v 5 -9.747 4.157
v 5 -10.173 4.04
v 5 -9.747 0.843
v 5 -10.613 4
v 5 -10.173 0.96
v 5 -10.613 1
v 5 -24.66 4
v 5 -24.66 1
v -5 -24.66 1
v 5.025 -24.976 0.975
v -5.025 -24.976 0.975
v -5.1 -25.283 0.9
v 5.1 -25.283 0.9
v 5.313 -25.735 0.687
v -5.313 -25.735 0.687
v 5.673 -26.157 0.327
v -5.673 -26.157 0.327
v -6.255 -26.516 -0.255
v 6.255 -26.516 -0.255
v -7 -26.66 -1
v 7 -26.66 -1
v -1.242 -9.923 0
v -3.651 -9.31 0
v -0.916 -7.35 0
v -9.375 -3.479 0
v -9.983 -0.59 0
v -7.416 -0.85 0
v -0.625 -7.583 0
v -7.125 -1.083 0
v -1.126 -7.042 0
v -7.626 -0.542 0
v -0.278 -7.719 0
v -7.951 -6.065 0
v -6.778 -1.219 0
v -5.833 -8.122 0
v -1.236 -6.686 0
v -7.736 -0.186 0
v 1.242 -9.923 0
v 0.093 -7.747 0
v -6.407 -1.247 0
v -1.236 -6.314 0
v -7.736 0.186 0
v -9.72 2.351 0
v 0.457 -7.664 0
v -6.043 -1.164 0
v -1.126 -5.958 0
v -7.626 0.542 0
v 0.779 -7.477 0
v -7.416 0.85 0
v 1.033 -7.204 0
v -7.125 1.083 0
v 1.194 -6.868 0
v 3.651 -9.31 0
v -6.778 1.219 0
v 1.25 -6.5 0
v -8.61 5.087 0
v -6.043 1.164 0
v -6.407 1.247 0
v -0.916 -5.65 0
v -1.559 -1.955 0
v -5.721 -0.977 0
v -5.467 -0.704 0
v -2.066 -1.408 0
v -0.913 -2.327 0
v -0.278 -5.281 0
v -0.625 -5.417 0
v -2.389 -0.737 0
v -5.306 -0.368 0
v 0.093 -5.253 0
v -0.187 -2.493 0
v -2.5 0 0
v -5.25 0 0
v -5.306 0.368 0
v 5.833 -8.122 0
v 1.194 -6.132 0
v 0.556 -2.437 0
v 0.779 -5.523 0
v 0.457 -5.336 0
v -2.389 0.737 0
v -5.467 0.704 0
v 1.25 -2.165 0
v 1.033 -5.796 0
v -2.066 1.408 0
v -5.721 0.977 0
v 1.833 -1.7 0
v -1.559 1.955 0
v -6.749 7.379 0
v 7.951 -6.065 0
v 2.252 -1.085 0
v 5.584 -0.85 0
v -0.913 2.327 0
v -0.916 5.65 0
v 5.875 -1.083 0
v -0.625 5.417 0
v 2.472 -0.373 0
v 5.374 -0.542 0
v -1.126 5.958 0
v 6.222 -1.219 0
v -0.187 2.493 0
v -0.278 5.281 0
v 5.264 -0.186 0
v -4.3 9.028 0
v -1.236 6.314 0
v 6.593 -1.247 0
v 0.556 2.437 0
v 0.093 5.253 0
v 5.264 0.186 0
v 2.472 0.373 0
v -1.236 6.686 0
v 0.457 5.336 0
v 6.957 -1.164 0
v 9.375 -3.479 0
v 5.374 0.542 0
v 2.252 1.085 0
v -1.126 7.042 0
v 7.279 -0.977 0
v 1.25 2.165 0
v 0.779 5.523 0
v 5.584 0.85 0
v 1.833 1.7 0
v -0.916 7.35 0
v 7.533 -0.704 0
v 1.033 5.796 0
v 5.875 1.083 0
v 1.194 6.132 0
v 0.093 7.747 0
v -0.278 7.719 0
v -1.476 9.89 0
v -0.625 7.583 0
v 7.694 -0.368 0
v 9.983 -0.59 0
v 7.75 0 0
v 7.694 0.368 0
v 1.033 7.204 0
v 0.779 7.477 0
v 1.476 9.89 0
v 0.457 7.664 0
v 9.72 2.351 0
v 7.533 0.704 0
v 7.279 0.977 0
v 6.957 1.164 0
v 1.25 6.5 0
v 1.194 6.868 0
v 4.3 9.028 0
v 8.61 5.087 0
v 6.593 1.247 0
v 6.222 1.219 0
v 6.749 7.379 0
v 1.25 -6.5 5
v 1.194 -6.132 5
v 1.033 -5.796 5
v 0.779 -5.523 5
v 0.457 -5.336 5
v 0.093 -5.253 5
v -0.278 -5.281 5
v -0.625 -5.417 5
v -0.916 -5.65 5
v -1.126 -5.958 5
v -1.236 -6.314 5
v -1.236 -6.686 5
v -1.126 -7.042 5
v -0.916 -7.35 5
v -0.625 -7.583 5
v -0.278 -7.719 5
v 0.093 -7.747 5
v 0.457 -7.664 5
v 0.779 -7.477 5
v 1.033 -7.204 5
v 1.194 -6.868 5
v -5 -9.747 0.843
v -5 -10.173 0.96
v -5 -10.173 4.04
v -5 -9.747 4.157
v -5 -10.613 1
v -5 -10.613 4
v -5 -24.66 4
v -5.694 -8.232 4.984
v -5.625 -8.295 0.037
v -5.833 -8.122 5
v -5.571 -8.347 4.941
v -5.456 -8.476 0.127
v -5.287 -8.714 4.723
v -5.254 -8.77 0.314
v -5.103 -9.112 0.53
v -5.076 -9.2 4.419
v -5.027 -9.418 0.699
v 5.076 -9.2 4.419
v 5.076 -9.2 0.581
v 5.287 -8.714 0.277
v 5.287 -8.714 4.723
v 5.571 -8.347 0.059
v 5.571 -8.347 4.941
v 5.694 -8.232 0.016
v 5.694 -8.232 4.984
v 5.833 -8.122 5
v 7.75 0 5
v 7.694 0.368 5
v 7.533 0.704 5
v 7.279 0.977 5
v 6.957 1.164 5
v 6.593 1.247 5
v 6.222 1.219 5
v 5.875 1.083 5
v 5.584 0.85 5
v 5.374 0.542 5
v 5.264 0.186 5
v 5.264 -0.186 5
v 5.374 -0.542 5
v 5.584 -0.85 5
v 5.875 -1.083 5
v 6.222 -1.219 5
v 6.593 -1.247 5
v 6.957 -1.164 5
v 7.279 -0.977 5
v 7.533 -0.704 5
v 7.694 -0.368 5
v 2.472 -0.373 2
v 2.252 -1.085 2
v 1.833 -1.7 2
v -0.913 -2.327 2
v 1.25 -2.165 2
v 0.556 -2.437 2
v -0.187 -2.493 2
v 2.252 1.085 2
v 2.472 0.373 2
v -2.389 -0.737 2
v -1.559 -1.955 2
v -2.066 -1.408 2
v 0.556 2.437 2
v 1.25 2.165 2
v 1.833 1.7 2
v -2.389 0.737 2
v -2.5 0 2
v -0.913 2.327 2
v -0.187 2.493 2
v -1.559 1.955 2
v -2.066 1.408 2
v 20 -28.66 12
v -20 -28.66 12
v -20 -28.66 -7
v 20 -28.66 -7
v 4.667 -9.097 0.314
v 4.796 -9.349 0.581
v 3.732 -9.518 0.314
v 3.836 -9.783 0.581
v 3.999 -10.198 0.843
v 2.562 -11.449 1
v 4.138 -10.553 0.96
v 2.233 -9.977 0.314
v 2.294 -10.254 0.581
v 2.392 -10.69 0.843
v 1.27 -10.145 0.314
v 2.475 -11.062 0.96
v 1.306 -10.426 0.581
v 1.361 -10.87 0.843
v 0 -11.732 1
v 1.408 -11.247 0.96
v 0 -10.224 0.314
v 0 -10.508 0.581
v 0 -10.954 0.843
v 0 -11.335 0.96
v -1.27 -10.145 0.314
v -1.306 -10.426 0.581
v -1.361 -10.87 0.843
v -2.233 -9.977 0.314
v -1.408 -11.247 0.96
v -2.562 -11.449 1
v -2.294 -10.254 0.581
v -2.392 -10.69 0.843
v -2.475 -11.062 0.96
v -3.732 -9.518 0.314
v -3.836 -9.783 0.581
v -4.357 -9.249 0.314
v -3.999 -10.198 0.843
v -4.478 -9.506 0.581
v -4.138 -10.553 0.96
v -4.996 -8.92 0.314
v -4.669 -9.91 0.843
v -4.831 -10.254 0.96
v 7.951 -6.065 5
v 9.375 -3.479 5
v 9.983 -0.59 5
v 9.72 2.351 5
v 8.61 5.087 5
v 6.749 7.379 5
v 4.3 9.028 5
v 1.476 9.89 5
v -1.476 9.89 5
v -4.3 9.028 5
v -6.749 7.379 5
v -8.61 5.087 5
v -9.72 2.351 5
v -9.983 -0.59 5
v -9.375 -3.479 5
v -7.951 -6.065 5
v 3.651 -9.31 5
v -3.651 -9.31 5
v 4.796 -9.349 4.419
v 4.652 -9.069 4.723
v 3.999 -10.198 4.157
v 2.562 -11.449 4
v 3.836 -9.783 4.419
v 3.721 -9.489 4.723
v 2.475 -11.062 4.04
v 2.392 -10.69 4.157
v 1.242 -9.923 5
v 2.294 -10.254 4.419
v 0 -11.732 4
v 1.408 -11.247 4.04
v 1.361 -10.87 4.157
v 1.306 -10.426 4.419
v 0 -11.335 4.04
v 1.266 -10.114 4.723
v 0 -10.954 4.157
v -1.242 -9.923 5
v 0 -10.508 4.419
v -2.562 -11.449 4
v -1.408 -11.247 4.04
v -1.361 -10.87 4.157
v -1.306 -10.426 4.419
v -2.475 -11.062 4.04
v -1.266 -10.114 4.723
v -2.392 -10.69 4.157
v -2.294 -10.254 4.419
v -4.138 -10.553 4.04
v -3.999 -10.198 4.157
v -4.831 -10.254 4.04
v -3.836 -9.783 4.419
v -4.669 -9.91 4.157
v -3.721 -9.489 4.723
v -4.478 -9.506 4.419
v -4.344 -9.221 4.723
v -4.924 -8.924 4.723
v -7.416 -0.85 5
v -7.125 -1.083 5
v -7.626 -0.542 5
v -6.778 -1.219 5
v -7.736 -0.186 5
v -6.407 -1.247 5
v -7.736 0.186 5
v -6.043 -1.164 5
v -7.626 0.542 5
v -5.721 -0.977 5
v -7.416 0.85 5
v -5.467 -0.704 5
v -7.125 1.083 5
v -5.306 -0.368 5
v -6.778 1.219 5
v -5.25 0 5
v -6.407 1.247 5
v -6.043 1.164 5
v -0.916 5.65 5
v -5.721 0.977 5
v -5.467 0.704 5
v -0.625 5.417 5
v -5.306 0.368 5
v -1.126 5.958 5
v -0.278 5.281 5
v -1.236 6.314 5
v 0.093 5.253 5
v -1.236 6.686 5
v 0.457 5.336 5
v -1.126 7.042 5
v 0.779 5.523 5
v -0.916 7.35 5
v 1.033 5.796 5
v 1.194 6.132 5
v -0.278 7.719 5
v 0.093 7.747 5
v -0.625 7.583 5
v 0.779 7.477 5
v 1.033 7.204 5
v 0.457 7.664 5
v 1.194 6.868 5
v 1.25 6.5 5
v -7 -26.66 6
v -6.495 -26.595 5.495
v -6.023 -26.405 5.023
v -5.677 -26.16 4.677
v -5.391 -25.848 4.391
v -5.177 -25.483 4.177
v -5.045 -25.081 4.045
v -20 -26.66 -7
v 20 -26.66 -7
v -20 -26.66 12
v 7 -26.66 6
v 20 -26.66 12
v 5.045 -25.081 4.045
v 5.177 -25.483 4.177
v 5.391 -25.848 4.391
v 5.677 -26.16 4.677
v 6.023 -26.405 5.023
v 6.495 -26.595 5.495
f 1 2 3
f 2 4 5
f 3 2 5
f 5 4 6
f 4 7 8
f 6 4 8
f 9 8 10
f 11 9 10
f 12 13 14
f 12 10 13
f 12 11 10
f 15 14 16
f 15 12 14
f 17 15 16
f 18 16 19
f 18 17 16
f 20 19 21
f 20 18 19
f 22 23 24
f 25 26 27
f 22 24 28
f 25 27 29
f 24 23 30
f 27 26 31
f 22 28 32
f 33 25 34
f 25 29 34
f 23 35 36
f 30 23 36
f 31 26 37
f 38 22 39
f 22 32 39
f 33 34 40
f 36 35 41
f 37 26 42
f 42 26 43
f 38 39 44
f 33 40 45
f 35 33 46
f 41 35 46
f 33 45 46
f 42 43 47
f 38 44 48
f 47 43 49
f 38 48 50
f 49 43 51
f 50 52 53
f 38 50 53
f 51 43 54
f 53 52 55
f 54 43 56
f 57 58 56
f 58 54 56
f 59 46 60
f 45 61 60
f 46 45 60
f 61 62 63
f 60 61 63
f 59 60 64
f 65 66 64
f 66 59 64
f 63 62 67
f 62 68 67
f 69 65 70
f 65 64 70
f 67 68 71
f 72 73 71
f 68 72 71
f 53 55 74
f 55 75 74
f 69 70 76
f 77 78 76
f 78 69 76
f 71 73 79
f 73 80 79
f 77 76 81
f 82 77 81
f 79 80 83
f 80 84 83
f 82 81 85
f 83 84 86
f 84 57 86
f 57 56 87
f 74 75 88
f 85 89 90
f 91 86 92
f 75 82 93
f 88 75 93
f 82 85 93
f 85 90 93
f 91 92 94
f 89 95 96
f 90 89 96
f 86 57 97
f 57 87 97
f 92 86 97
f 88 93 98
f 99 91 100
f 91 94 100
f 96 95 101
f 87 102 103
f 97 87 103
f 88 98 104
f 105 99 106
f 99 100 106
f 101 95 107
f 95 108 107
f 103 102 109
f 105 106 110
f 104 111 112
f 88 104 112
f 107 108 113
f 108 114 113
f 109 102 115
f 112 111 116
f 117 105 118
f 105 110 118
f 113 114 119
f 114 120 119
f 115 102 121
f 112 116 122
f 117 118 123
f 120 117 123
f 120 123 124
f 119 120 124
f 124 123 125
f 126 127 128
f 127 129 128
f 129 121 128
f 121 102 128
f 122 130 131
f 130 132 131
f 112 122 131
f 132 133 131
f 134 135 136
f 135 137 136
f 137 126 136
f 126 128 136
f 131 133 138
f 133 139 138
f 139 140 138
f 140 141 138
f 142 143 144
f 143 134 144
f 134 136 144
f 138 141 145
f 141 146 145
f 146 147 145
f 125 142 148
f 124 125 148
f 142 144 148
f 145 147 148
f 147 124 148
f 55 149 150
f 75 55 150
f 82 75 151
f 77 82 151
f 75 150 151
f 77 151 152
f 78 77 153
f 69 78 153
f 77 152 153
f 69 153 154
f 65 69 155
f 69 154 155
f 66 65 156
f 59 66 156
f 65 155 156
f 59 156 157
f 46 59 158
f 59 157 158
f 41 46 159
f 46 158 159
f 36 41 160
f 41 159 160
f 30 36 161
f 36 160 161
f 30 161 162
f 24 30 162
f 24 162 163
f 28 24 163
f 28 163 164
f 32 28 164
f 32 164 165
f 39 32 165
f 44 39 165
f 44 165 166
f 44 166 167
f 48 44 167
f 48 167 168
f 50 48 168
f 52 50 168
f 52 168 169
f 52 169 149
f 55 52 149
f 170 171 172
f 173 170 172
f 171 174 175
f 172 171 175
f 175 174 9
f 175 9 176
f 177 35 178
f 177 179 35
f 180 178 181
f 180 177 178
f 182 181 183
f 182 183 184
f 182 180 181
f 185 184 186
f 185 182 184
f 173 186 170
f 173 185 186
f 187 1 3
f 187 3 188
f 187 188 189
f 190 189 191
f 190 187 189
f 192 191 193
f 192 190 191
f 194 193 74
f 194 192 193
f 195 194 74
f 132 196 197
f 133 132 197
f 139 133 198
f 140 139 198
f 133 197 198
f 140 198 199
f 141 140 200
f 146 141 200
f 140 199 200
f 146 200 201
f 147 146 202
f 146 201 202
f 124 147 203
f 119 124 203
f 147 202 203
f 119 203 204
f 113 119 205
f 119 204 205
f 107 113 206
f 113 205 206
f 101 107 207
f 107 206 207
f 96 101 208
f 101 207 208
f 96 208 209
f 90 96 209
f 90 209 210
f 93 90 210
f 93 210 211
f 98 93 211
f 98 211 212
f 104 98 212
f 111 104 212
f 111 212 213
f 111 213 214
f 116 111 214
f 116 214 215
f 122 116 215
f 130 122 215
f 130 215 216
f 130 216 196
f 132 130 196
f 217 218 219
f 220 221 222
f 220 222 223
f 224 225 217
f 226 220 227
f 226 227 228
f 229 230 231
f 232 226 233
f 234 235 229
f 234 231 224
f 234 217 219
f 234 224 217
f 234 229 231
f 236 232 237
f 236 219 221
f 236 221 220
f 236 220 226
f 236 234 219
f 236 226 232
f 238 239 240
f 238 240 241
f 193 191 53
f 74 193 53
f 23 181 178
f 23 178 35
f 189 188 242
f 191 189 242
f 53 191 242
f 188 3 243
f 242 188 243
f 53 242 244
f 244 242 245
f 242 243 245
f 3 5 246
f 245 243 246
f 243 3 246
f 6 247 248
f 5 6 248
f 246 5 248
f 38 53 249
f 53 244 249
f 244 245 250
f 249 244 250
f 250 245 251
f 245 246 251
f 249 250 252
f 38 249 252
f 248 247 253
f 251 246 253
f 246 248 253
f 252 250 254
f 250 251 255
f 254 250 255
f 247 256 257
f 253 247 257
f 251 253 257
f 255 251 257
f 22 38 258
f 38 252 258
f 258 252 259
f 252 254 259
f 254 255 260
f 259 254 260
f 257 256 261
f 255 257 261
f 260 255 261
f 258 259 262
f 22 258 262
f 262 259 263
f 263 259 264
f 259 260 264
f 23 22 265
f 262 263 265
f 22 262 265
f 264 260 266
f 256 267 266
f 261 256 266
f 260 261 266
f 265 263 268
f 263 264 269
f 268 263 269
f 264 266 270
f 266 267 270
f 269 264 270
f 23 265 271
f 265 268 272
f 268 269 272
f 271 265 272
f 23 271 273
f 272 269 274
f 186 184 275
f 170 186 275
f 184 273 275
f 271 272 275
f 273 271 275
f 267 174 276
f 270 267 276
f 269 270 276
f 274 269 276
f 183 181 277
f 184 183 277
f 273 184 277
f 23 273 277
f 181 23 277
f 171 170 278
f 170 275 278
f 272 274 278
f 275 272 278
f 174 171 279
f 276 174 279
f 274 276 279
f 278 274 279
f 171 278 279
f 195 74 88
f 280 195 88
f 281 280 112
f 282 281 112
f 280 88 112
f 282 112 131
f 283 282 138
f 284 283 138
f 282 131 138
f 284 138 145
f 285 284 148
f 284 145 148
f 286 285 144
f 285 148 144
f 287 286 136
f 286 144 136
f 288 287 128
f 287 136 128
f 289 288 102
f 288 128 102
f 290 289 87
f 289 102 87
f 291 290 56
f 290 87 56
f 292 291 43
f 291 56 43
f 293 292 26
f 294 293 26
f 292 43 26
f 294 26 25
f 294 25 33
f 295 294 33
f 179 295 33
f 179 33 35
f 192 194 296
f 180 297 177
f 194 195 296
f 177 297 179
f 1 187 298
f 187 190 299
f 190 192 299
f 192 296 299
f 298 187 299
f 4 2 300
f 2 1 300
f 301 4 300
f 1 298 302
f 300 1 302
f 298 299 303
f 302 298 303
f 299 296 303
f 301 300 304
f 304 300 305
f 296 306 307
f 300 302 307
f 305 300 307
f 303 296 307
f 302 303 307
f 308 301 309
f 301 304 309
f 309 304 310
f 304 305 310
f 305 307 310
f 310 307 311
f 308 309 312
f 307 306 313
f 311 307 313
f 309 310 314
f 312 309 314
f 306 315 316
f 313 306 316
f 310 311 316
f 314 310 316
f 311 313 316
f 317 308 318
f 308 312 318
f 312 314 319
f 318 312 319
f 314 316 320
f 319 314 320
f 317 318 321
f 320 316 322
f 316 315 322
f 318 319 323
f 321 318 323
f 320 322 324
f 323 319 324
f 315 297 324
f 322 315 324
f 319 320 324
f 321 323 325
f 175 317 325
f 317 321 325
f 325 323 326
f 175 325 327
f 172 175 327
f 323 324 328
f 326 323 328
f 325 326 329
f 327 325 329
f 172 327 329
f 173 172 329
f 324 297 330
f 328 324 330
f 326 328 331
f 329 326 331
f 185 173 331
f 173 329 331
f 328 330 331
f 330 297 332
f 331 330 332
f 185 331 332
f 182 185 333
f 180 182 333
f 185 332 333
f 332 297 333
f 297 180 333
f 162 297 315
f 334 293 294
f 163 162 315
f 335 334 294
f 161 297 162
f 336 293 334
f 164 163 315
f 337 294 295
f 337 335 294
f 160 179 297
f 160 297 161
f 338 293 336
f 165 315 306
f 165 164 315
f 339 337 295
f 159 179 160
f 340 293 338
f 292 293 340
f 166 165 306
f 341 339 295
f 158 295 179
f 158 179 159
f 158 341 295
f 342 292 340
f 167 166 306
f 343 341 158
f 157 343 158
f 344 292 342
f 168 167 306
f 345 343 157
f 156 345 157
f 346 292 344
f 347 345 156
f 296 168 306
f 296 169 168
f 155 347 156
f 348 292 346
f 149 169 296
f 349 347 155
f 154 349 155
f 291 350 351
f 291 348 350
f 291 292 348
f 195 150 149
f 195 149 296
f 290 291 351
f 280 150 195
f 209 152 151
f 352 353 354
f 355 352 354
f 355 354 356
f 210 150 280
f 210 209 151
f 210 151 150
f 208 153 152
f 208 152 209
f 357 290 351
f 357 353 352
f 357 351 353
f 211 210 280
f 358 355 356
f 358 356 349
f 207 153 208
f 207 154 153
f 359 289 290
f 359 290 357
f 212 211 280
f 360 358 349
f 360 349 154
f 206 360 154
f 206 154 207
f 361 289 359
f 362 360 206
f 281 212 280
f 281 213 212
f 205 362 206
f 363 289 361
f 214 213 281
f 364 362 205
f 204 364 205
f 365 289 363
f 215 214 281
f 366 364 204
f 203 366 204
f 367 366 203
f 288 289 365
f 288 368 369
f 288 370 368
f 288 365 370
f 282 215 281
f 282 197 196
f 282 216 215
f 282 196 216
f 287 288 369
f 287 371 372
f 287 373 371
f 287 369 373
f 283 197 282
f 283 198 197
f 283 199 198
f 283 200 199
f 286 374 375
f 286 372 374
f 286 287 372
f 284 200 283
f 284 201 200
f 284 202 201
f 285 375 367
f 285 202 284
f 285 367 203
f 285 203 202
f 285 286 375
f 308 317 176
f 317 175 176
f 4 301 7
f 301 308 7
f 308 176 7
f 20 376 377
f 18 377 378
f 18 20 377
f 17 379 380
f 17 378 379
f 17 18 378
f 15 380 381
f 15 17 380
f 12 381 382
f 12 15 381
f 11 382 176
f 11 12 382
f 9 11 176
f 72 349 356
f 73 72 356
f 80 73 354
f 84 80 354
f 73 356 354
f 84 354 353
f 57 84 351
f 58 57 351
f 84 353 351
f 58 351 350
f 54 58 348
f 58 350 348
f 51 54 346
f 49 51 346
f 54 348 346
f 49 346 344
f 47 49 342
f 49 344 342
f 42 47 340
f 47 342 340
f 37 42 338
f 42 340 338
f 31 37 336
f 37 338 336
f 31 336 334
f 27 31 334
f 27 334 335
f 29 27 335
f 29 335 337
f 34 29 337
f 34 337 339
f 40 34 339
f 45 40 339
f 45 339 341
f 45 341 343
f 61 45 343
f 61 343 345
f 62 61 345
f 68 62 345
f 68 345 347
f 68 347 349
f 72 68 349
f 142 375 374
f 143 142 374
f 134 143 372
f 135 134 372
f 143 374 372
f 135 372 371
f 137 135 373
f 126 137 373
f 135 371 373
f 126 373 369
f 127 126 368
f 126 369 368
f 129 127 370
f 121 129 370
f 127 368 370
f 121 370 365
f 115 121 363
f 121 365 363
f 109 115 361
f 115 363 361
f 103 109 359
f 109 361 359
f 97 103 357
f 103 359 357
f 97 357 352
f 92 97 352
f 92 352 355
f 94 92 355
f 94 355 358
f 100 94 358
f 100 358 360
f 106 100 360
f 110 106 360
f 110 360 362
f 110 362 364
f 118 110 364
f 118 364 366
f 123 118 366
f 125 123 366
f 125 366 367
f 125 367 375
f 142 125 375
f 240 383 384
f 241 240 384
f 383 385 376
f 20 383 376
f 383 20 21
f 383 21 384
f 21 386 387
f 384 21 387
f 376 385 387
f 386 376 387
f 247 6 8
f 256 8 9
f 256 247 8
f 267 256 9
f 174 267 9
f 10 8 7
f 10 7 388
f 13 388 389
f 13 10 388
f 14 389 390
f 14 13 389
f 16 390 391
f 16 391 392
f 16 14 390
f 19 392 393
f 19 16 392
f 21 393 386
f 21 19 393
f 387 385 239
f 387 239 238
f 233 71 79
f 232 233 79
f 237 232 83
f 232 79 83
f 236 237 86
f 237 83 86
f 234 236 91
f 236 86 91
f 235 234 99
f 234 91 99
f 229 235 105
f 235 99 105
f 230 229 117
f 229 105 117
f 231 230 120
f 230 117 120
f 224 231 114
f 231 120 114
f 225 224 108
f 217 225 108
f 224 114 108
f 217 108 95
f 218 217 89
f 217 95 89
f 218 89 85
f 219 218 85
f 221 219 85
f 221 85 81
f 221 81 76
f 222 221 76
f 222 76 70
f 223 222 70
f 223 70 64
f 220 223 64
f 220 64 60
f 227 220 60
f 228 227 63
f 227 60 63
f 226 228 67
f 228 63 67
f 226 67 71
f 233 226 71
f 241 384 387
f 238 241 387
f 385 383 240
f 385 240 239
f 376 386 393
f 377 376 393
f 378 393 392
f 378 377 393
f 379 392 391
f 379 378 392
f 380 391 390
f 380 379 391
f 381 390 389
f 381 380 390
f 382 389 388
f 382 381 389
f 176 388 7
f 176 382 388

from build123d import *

# Parameters (mm, degrees)
SKETCH1_R            = 10
BOSS_EXTRUDE1_DEPTH  = 5
SKETCH2_R            = 1.25
CUT_EXTRUDE1_DEPTH   = 16
SKETCH3_R            = 2.5
CUT_EXTRUDE2_DEPTH   = 2
EXTRUDE_1_DEPTH      = 1.5
EXTRUDE_1_DEPTH_BACK = 1.5
SKETCH_3_W           = 40
SKETCH_3_H           = 19
EXTRUDE_2_DEPTH      = 2
FILLET_1_R           = 2


with BuildPart() as part:
    # Sketch1 → Boss-Extrude1 (new body)
    with BuildSketch(Plane.XY):
        Circle(SKETCH1_R)
    extrude(amount=BOSS_EXTRUDE1_DEPTH)

    # Sketch2 → Cut-Extrude1 (cut, through all)
    with BuildSketch(Plane.XY.offset(5)):
        with Locations((0, 6.5)):
            Circle(SKETCH2_R)
        with Locations((6.5, 0)):
            Circle(SKETCH2_R)
        with Locations((0, -6.5)):
            Circle(SKETCH2_R)
        with Locations((-6.5, 0)):
            Circle(SKETCH2_R)
    extrude(amount=-CUT_EXTRUDE1_DEPTH, mode=Mode.SUBTRACT)

    # Sketch3 → Cut-Extrude2 (cut)
    with BuildSketch(Plane(origin=(0, 0, 0), x_dir=(-1, 0, 0), z_dir=(0, 0, -1))):
        Circle(SKETCH3_R)
    extrude(amount=-CUT_EXTRUDE2_DEPTH, mode=Mode.SUBTRACT)

    # 草图2 → 凸台-拉伸1 (add, two sides: drawn at the far end of the back side and taken through both)
    with BuildSketch(Plane.XY.offset(2.5).offset(-EXTRUDE_1_DEPTH_BACK)):
        with BuildLine():
            Line((-5, -8.660254038), (-5, -26.660254038))
            Line((-5, -26.660254038), (5, -26.660254038))
            Line((5, -26.660254038), (5, -8.660254038))
            ThreePointArc((5, -8.660254038), (0, -10), (-5, -8.660254038))
        make_face()
    extrude(amount=EXTRUDE_1_DEPTH + EXTRUDE_1_DEPTH_BACK)

    # 草图3 → 凸台-拉伸2 (add)
    with BuildSketch(Plane.XZ.offset(26.660254038)):
        with Locations((0, 2.5)):
            Rectangle(SKETCH_3_W, SKETCH_3_H)
    extrude(amount=EXTRUDE_2_DEPTH)

    # 圆角1
    # the kernel refuses this fillet: 2 mm, written as the material it adds along each edge
    with BuildSketch(Plane(origin=(-5, -8.660254038, 4), x_dir=(0, -1, 0), z_dir=(0, 0, -1))) as fillet_1_piece_1:
        with BuildLine():
            CenterArc((1.086540307, 2), FILLET_1_R, 215.685334713, 54.314665287)
            Line((-0.537925417, 0.833333333), (-0.570414732, 0.81))
            ThreePointArc((-0.570414732, 0.81), (-0.292230876, 0.40164682), (-0.034641016, -0.02))
            Line((-0.034641016, -0.02), (0, -0.04))
            Line((0, -0.04), (1.086540307, -0.04))
            Line((1.086540307, -0.04), (1.086540307, 0))
        make_face()
    extrude(amount=3)
    with BuildSketch(Plane(origin=(0, 0, 1), x_dir=(0.8172880266959527, -0.5762293652873269, 0), z_dir=(0.5762293652873269, 0.8172880266959527, 0))) as fillet_1_piece_2_section:
        with BuildLine():
            CenterArc((11.732050808, 2), FILLET_1_R, 210, 60)
            Line((10, 1), (9.965358984, 0.98))
            ThreePointArc((9.965358984, 0.98), (9.96, 0.5), (9.96, 0))
            Line((9.96, 0), (10, -0.04))
            Line((10, -0.04), (11.732050808, -0.04))
            Line((11.732050808, -0.04), (11.732050808, 0))
        make_face()
    fillet_1_piece_2 = revolve(axis=Axis((0, 0, 1), (0, 0, -1)), revolution_arc=109.628458137, mode=Mode.PRIVATE)
    fillet_1_piece_2 = split(fillet_1_piece_2, bisect_by=Plane(origin=(5, -10.001483163, 0.740495883), z_dir=(-1, 0, 0)), keep=Keep.TOP, mode=Mode.PRIVATE)
    fillet_1_piece_2 = split(fillet_1_piece_2, bisect_by=Plane(origin=(-5, -10.001483163, 0.740495883), z_dir=(1, 0, 0)), keep=Keep.TOP, mode=Mode.PRIVATE)
    add(fillet_1_piece_2)
    with BuildSketch(Plane(origin=(5, -8.660254038, 4), x_dir=(0, -1, 0), z_dir=(0, 0, -1))) as fillet_1_piece_3:
        with BuildLine():
            CenterArc((1.086540307, -2), FILLET_1_R, 90, 54.314665287)
            Line((-0.537925417, -0.833333333), (-0.570414732, -0.81))
            ThreePointArc((-0.570414732, -0.81), (-0.292230876, -0.40164682), (-0.034641016, 0.02))
            Line((-0.034641016, 0.02), (0, 0.04))
            Line((0, 0.04), (1.086540307, 0.04))
            Line((1.086540307, 0.04), (1.086540307, 0))
        make_face()
    extrude(amount=3)
    with BuildSketch(Plane(origin=(5, -26.660254038, 1), x_dir=(1, 0, 0), z_dir=(0, 0, 1))) as fillet_1_piece_4:
        with BuildLine():
            CenterArc((FILLET_1_R, FILLET_1_R), FILLET_1_R, 180, 90)
            Line((0, FILLET_1_R), (-FILLET_1_R * 0.02, FILLET_1_R))
            Line((-FILLET_1_R * 0.02, FILLET_1_R), (-FILLET_1_R * 0.02, -FILLET_1_R * 0.02))
            Line((-FILLET_1_R * 0.02, -FILLET_1_R * 0.02), (FILLET_1_R, -FILLET_1_R * 0.02))
            Line((FILLET_1_R, -FILLET_1_R * 0.02), (FILLET_1_R, 0))
        make_face()
    extrude(amount=3)
    with BuildSketch(Plane(origin=(-5, -26.660254038, 1), x_dir=(0, 0, -1), z_dir=(1, 0, 0))) as fillet_1_piece_5:
        with BuildLine():
            CenterArc((FILLET_1_R, FILLET_1_R), FILLET_1_R, 180, 90)
            Line((0, FILLET_1_R), (-FILLET_1_R * 0.02, FILLET_1_R))
            Line((-FILLET_1_R * 0.02, FILLET_1_R), (-FILLET_1_R * 0.02, -FILLET_1_R * 0.02))
            Line((-FILLET_1_R * 0.02, -FILLET_1_R * 0.02), (FILLET_1_R, -FILLET_1_R * 0.02))
            Line((FILLET_1_R, -FILLET_1_R * 0.02), (FILLET_1_R, 0))
        make_face()
    extrude(amount=10)
    with BuildSketch(Plane(origin=(-5, -26.660254038, 1), x_dir=(-1, 0, 0), z_dir=(0, 0, 1))) as fillet_1_piece_6:
        with BuildLine():
            CenterArc((FILLET_1_R, -FILLET_1_R), FILLET_1_R, 90, 90)
            Line((0, -FILLET_1_R), (-FILLET_1_R * 0.02, -FILLET_1_R))
            Line((-FILLET_1_R * 0.02, -FILLET_1_R), (-FILLET_1_R * 0.02, FILLET_1_R * 0.02))
            Line((-FILLET_1_R * 0.02, FILLET_1_R * 0.02), (FILLET_1_R, FILLET_1_R * 0.02))
            Line((FILLET_1_R, FILLET_1_R * 0.02), (FILLET_1_R, 0))
        make_face()
    extrude(amount=3)
    with BuildSketch(Plane(origin=(0, 0, 4), x_dir=(0.8172880266959527, -0.5762293652873269, 0), z_dir=(0.5762293652873269, 0.8172880266959527, 0))) as fillet_1_piece_7_section:
        with BuildLine():
            CenterArc((11.732050808, -2), FILLET_1_R, 90, 60)
            Line((10, -1), (9.965358984, -0.98))
            ThreePointArc((9.965358984, -0.98), (9.96, -0.5), (9.96, 0))
            Line((9.96, 0), (10, 0.04))
            Line((10, 0.04), (11.732050808, 0.04))
            Line((11.732050808, 0.04), (11.732050808, 0))
        make_face()
    fillet_1_piece_7 = revolve(axis=Axis((0, 0, 4), (0, 0, -1)), revolution_arc=109.628458137, mode=Mode.PRIVATE)
    fillet_1_piece_7 = split(fillet_1_piece_7, bisect_by=Plane(origin=(-5, -10.001483163, 4.259504117), z_dir=(1, 0, 0)), keep=Keep.TOP, mode=Mode.PRIVATE)
    fillet_1_piece_7 = split(fillet_1_piece_7, bisect_by=Plane(origin=(5, -10.001483163, 4.259504117), z_dir=(-1, 0, 0)), keep=Keep.TOP, mode=Mode.PRIVATE)
    add(fillet_1_piece_7)
    with BuildSketch(Plane(origin=(-5, -26.660254038, 4), x_dir=(0, 0, 1), z_dir=(1, 0, 0))) as fillet_1_piece_8:
        with BuildLine():
            CenterArc((FILLET_1_R, -FILLET_1_R), FILLET_1_R, 90, 90)
            Line((0, -FILLET_1_R), (-FILLET_1_R * 0.02, -FILLET_1_R))
            Line((-FILLET_1_R * 0.02, -FILLET_1_R), (-FILLET_1_R * 0.02, FILLET_1_R * 0.02))
            Line((-FILLET_1_R * 0.02, FILLET_1_R * 0.02), (FILLET_1_R, FILLET_1_R * 0.02))
            Line((FILLET_1_R, FILLET_1_R * 0.02), (FILLET_1_R, 0))
        make_face()
    extrude(amount=10)
    with BuildSketch(Plane(origin=(0, 0, 4), x_dir=(0.8172880266959527, -0.5762293652873269, 0), z_dir=(0.5762293652873269, 0.8172880266959527, 0))) as fillet_1_piece_9a_section:
        with BuildLine():
            CenterArc((11.732050808, -2), FILLET_1_R, 90, 60)
            Line((10, -1), (9.965358984, -0.98))
            ThreePointArc((9.965358984, -0.98), (9.96, -0.5), (9.96, 0))
            Line((9.96, 0), (10, 0.04))
            Line((10, 0.04), (11.732050808, 0.04))
            Line((11.732050808, 0.04), (11.732050808, 0))
        make_face()
    fillet_1_piece_9a = revolve(axis=Axis((0, 0, 4), (0, 0, -1)), revolution_arc=109.628458137, mode=Mode.PRIVATE)
    fillet_1_piece_9a = split(fillet_1_piece_9a, bisect_by=Plane(origin=(-5, -7.746585208, 4.247464025), z_dir=(-1, 0, 0)), keep=Keep.TOP, mode=Mode.PRIVATE)
    with BuildSketch(Plane(origin=(-5, -8.660254038, 6.716350767), x_dir=(0, -1, 0), z_dir=(0, 0, -1))) as fillet_1_piece_9b_section:
        with BuildLine():
            CenterArc((1.086540307, 2), FILLET_1_R, 215.685334713, 54.314665287)
            Line((-0.537925417, 0.833333333), (-0.570414732, 0.81))
            ThreePointArc((-0.570414732, 0.81), (-0.292230876, 0.40164682), (-0.034641016, -0.02))
            Line((-0.034641016, -0.02), (0, -0.04))
            Line((0, -0.04), (1.086540307, -0.04))
            Line((1.086540307, -0.04), (1.086540307, 0))
        make_face()
    fillet_1_piece_9b = extrude(amount=5.716350767, mode=Mode.PRIVATE)
    fillet_1_piece_9b = split(fillet_1_piece_9b, bisect_by=Plane(origin=(-5.179096693, -8.792679458, 4), z_dir=(0, 0, 1)), keep=Keep.TOP, mode=Mode.PRIVATE)
    fillet_1_piece_9b = split(fillet_1_piece_9b, bisect_by=Plane(origin=(-5.179096693, -8.792679458, 5), z_dir=(0, 0, -1)), keep=Keep.TOP, mode=Mode.PRIVATE)
    fillet_1_piece_9 = fillet_1_piece_9a & fillet_1_piece_9b
    add(fillet_1_piece_9)
    with BuildSketch(Plane(origin=(0, 0, 1), x_dir=(0.8172880266959527, -0.5762293652873269, 0), z_dir=(0.5762293652873269, 0.8172880266959527, 0))) as fillet_1_piece_10a_section:
        with BuildLine():
            CenterArc((11.732050808, 2), FILLET_1_R, 210, 60)
            Line((10, 1), (9.965358984, 0.98))
            ThreePointArc((9.965358984, 0.98), (9.96, 0.5), (9.96, 0))
            Line((9.96, 0), (10, -0.04))
            Line((10, -0.04), (11.732050808, -0.04))
            Line((11.732050808, -0.04), (11.732050808, 0))
        make_face()
    fillet_1_piece_10a = revolve(axis=Axis((0, 0, 1), (0, 0, -1)), revolution_arc=109.628458137, mode=Mode.PRIVATE)
    fillet_1_piece_10a = split(fillet_1_piece_10a, bisect_by=Plane(origin=(-5, -7.746585208, 0.752535975), z_dir=(-1, 0, 0)), keep=Keep.TOP, mode=Mode.PRIVATE)
    with BuildSketch(Plane(origin=(-5, -8.660254038, 4), x_dir=(0, -1, 0), z_dir=(0, 0, -1))) as fillet_1_piece_10b_section:
        with BuildLine():
            CenterArc((1.086540307, 2), FILLET_1_R, 215.685334713, 54.314665287)
            Line((-0.537925417, 0.833333333), (-0.570414732, 0.81))
            ThreePointArc((-0.570414732, 0.81), (-0.292230876, 0.40164682), (-0.034641016, -0.02))
            Line((-0.034641016, -0.02), (0, -0.04))
            Line((0, -0.04), (1.086540307, -0.04))
            Line((1.086540307, -0.04), (1.086540307, 0))
        make_face()
    fillet_1_piece_10b = extrude(amount=5.716350767, mode=Mode.PRIVATE)
    fillet_1_piece_10b = split(fillet_1_piece_10b, bisect_by=Plane(origin=(-5.179096693, -8.792679458, 1), z_dir=(0, 0, -1)), keep=Keep.TOP, mode=Mode.PRIVATE)
    fillet_1_piece_10b = split(fillet_1_piece_10b, bisect_by=Plane(origin=(-5.179096693, -8.792679458, 0), z_dir=(0, 0, 1)), keep=Keep.TOP, mode=Mode.PRIVATE)
    fillet_1_piece_10 = fillet_1_piece_10a & fillet_1_piece_10b
    add(fillet_1_piece_10)
    with BuildSketch(Plane(origin=(5, -8.660254038, 4), x_dir=(0, -1, 0), z_dir=(0, 0, -1))) as fillet_1_piece_11a_section:
        with BuildLine():
            CenterArc((1.086540307, -2), FILLET_1_R, 90, 54.314665287)
            Line((-0.537925417, -0.833333333), (-0.570414732, -0.81))
            ThreePointArc((-0.570414732, -0.81), (-0.292230876, -0.40164682), (-0.034641016, 0.02))
            Line((-0.034641016, 0.02), (0, 0.04))
            Line((0, 0.04), (1.086540307, 0.04))
            Line((1.086540307, 0.04), (1.086540307, 0))
        make_face()
    fillet_1_piece_11a = extrude(amount=5.716350767, mode=Mode.PRIVATE)
    fillet_1_piece_11a = split(fillet_1_piece_11a, bisect_by=Plane(origin=(5.179096693, -8.792679458, 1), z_dir=(0, 0, -1)), keep=Keep.TOP, mode=Mode.PRIVATE)
    fillet_1_piece_11a = split(fillet_1_piece_11a, bisect_by=Plane(origin=(5.179096693, -8.792679458, 0), z_dir=(0, 0, 1)), keep=Keep.TOP, mode=Mode.PRIVATE)
    with BuildSketch(Plane(origin=(0, 0, 1), x_dir=(0.8172880266959527, -0.5762293652873269, 0), z_dir=(0.5762293652873269, 0.8172880266959527, 0))) as fillet_1_piece_11b_section:
        with BuildLine():
            CenterArc((11.732050808, 2), FILLET_1_R, 210, 60)
            Line((10, 1), (9.965358984, 0.98))
            ThreePointArc((9.965358984, 0.98), (9.96, 0.5), (9.96, 0))
            Line((9.96, 0), (10, -0.04))
            Line((10, -0.04), (11.732050808, -0.04))
            Line((11.732050808, -0.04), (11.732050808, 0))
        make_face()
    fillet_1_piece_11b = revolve(axis=Axis((0, 0, 1), (0, 0, -1)), revolution_arc=109.628458137, mode=Mode.PRIVATE)
    fillet_1_piece_11b = split(fillet_1_piece_11b, bisect_by=Plane(origin=(5, -7.746585383, 0.752536044), z_dir=(1, 0, 0)), keep=Keep.TOP, mode=Mode.PRIVATE)
    fillet_1_piece_11 = fillet_1_piece_11a & fillet_1_piece_11b
    add(fillet_1_piece_11)
    with BuildSketch(Plane(origin=(0, 0, 4), x_dir=(0.8172880266959527, -0.5762293652873269, 0), z_dir=(0.5762293652873269, 0.8172880266959527, 0))) as fillet_1_piece_12a_section:
        with BuildLine():
            CenterArc((11.732050808, -2), FILLET_1_R, 90, 60)
            Line((10, -1), (9.965358984, -0.98))
            ThreePointArc((9.965358984, -0.98), (9.96, -0.5), (9.96, 0))
            Line((9.96, 0), (10, 0.04))
            Line((10, 0.04), (11.732050808, 0.04))
            Line((11.732050808, 0.04), (11.732050808, 0))
        make_face()
    fillet_1_piece_12a = revolve(axis=Axis((0, 0, 4), (0, 0, -1)), revolution_arc=109.628458137, mode=Mode.PRIVATE)
    fillet_1_piece_12a = split(fillet_1_piece_12a, bisect_by=Plane(origin=(5, -7.746585383, 4.247463956), z_dir=(1, 0, 0)), keep=Keep.TOP, mode=Mode.PRIVATE)
    with BuildSketch(Plane(origin=(5, -8.660254038, 6.716350767), x_dir=(0, -1, 0), z_dir=(0, 0, -1))) as fillet_1_piece_12b_section:
        with BuildLine():
            CenterArc((1.086540307, -2), FILLET_1_R, 90, 54.314665287)
            Line((-0.537925417, -0.833333333), (-0.570414732, -0.81))
            ThreePointArc((-0.570414732, -0.81), (-0.292230876, -0.40164682), (-0.034641016, 0.02))
            Line((-0.034641016, 0.02), (0, 0.04))
            Line((0, 0.04), (1.086540307, 0.04))
            Line((1.086540307, 0.04), (1.086540307, 0))
        make_face()
    fillet_1_piece_12b = extrude(amount=5.716350767, mode=Mode.PRIVATE)
    fillet_1_piece_12b = split(fillet_1_piece_12b, bisect_by=Plane(origin=(5.179096693, -8.792679458, 4), z_dir=(0, 0, 1)), keep=Keep.TOP, mode=Mode.PRIVATE)
    fillet_1_piece_12b = split(fillet_1_piece_12b, bisect_by=Plane(origin=(5.179096693, -8.792679458, 5), z_dir=(0, 0, -1)), keep=Keep.TOP, mode=Mode.PRIVATE)
    fillet_1_piece_12 = fillet_1_piece_12a & fillet_1_piece_12b
    add(fillet_1_piece_12)
    with BuildSketch(Plane(origin=(5, -26.660254038, -4), x_dir=(1, 0, 0), z_dir=(0, 0, 1))) as fillet_1_piece_13a_section:
        with BuildLine():
            CenterArc((FILLET_1_R, FILLET_1_R), FILLET_1_R, 180, 90)
            Line((0, FILLET_1_R), (-FILLET_1_R * 0.02, FILLET_1_R))
            Line((-FILLET_1_R * 0.02, FILLET_1_R), (-FILLET_1_R * 0.02, -FILLET_1_R * 0.02))
            Line((-FILLET_1_R * 0.02, -FILLET_1_R * 0.02), (FILLET_1_R, -FILLET_1_R * 0.02))
            Line((FILLET_1_R, -FILLET_1_R * 0.02), (FILLET_1_R, 0))
        make_face()
    fillet_1_piece_13a = extrude(amount=8, mode=Mode.PRIVATE)
    fillet_1_piece_13a = split(fillet_1_piece_13a, bisect_by=Plane(origin=(5.452790229, -26.207463809, 1), z_dir=(0, 0, -1)), keep=Keep.TOP, mode=Mode.PRIVATE)
    with BuildSketch(Plane(origin=(-5, -26.660254038, 1), x_dir=(0, 0, -1), z_dir=(1, 0, 0))) as fillet_1_piece_13b_section:
        with BuildLine():
            CenterArc((FILLET_1_R, FILLET_1_R), FILLET_1_R, 180, 90)
            Line((0, FILLET_1_R), (-FILLET_1_R * 0.02, FILLET_1_R))
            Line((-FILLET_1_R * 0.02, FILLET_1_R), (-FILLET_1_R * 0.02, -FILLET_1_R * 0.02))
            Line((-FILLET_1_R * 0.02, -FILLET_1_R * 0.02), (FILLET_1_R, -FILLET_1_R * 0.02))
            Line((FILLET_1_R, -FILLET_1_R * 0.02), (FILLET_1_R, 0))
        make_face()
    fillet_1_piece_13b = extrude(amount=15, mode=Mode.PRIVATE)
    fillet_1_piece_13b = split(fillet_1_piece_13b, bisect_by=Plane(origin=(5, -26.207463809, 0.547209771), z_dir=(1, 0, 0)), keep=Keep.TOP, mode=Mode.PRIVATE)
    fillet_1_piece_13 = fillet_1_piece_13a & fillet_1_piece_13b
    add(fillet_1_piece_13)
    with BuildSketch(Plane(origin=(-5, -26.660254038, 4), x_dir=(0, 0, 1), z_dir=(1, 0, 0))) as fillet_1_piece_14a_section:
        with BuildLine():
            CenterArc((FILLET_1_R, -FILLET_1_R), FILLET_1_R, 90, 90)
            Line((0, -FILLET_1_R), (-FILLET_1_R * 0.02, -FILLET_1_R))
            Line((-FILLET_1_R * 0.02, -FILLET_1_R), (-FILLET_1_R * 0.02, FILLET_1_R * 0.02))
            Line((-FILLET_1_R * 0.02, FILLET_1_R * 0.02), (FILLET_1_R, FILLET_1_R * 0.02))
            Line((FILLET_1_R, FILLET_1_R * 0.02), (FILLET_1_R, 0))
        make_face()
    fillet_1_piece_14a = extrude(amount=15, mode=Mode.PRIVATE)
    fillet_1_piece_14a = split(fillet_1_piece_14a, bisect_by=Plane(origin=(5, -26.207463809, 4.452790229), z_dir=(1, 0, 0)), keep=Keep.TOP, mode=Mode.PRIVATE)
    with BuildSketch(Plane(origin=(5, -26.660254038, 1), x_dir=(1, 0, 0), z_dir=(0, 0, 1))) as fillet_1_piece_14b_section:
        with BuildLine():
            CenterArc((FILLET_1_R, FILLET_1_R), FILLET_1_R, 180, 90)
            Line((0, FILLET_1_R), (-FILLET_1_R * 0.02, FILLET_1_R))
            Line((-FILLET_1_R * 0.02, FILLET_1_R), (-FILLET_1_R * 0.02, -FILLET_1_R * 0.02))
            Line((-FILLET_1_R * 0.02, -FILLET_1_R * 0.02), (FILLET_1_R, -FILLET_1_R * 0.02))
            Line((FILLET_1_R, -FILLET_1_R * 0.02), (FILLET_1_R, 0))
        make_face()
    fillet_1_piece_14b = extrude(amount=8, mode=Mode.PRIVATE)
    fillet_1_piece_14b = split(fillet_1_piece_14b, bisect_by=Plane(origin=(5.452790229, -26.207463809, 4), z_dir=(0, 0, 1)), keep=Keep.TOP, mode=Mode.PRIVATE)
    fillet_1_piece_14 = fillet_1_piece_14a & fillet_1_piece_14b
    add(fillet_1_piece_14)
    with BuildSketch(Plane(origin=(-10, -26.660254038, 1), x_dir=(0, 0, -1), z_dir=(1, 0, 0))) as fillet_1_piece_15a_section:
        with BuildLine():
            CenterArc((FILLET_1_R, FILLET_1_R), FILLET_1_R, 180, 90)
            Line((0, FILLET_1_R), (-FILLET_1_R * 0.02, FILLET_1_R))
            Line((-FILLET_1_R * 0.02, FILLET_1_R), (-FILLET_1_R * 0.02, -FILLET_1_R * 0.02))
            Line((-FILLET_1_R * 0.02, -FILLET_1_R * 0.02), (FILLET_1_R, -FILLET_1_R * 0.02))
            Line((FILLET_1_R, -FILLET_1_R * 0.02), (FILLET_1_R, 0))
        make_face()
    fillet_1_piece_15a = extrude(amount=15, mode=Mode.PRIVATE)
    fillet_1_piece_15a = split(fillet_1_piece_15a, bisect_by=Plane(origin=(-5, -26.207463809, 0.547209771), z_dir=(-1, 0, 0)), keep=Keep.TOP, mode=Mode.PRIVATE)
    with BuildSketch(Plane(origin=(-5, -26.660254038, -4), x_dir=(-1, 0, 0), z_dir=(0, 0, 1))) as fillet_1_piece_15b_section:
        with BuildLine():
            CenterArc((FILLET_1_R, -FILLET_1_R), FILLET_1_R, 90, 90)
            Line((0, -FILLET_1_R), (-FILLET_1_R * 0.02, -FILLET_1_R))
            Line((-FILLET_1_R * 0.02, -FILLET_1_R), (-FILLET_1_R * 0.02, FILLET_1_R * 0.02))
            Line((-FILLET_1_R * 0.02, FILLET_1_R * 0.02), (FILLET_1_R, FILLET_1_R * 0.02))
            Line((FILLET_1_R, FILLET_1_R * 0.02), (FILLET_1_R, 0))
        make_face()
    fillet_1_piece_15b = extrude(amount=8, mode=Mode.PRIVATE)
    fillet_1_piece_15b = split(fillet_1_piece_15b, bisect_by=Plane(origin=(-5.452790229, -26.207463809, 1), z_dir=(0, 0, -1)), keep=Keep.TOP, mode=Mode.PRIVATE)
    fillet_1_piece_15 = fillet_1_piece_15a & fillet_1_piece_15b
    add(fillet_1_piece_15)
    with BuildSketch(Plane(origin=(-10, -26.660254038, 4), x_dir=(0, 0, 1), z_dir=(1, 0, 0))) as fillet_1_piece_16a_section:
        with BuildLine():
            CenterArc((FILLET_1_R, -FILLET_1_R), FILLET_1_R, 90, 90)
            Line((0, -FILLET_1_R), (-FILLET_1_R * 0.02, -FILLET_1_R))
            Line((-FILLET_1_R * 0.02, -FILLET_1_R), (-FILLET_1_R * 0.02, FILLET_1_R * 0.02))
            Line((-FILLET_1_R * 0.02, FILLET_1_R * 0.02), (FILLET_1_R, FILLET_1_R * 0.02))
            Line((FILLET_1_R, FILLET_1_R * 0.02), (FILLET_1_R, 0))
        make_face()
    fillet_1_piece_16a = extrude(amount=15, mode=Mode.PRIVATE)
    fillet_1_piece_16a = split(fillet_1_piece_16a, bisect_by=Plane(origin=(-5, -26.207463809, 4.452790229), z_dir=(-1, 0, 0)), keep=Keep.TOP, mode=Mode.PRIVATE)
    with BuildSketch(Plane(origin=(-5, -26.660254038, 1), x_dir=(-1, 0, 0), z_dir=(0, 0, 1))) as fillet_1_piece_16b_section:
        with BuildLine():
            CenterArc((FILLET_1_R, -FILLET_1_R), FILLET_1_R, 90, 90)
            Line((0, -FILLET_1_R), (-FILLET_1_R * 0.02, -FILLET_1_R))
            Line((-FILLET_1_R * 0.02, -FILLET_1_R), (-FILLET_1_R * 0.02, FILLET_1_R * 0.02))
            Line((-FILLET_1_R * 0.02, FILLET_1_R * 0.02), (FILLET_1_R, FILLET_1_R * 0.02))
            Line((FILLET_1_R, FILLET_1_R * 0.02), (FILLET_1_R, 0))
        make_face()
    fillet_1_piece_16b = extrude(amount=8, mode=Mode.PRIVATE)
    fillet_1_piece_16b = split(fillet_1_piece_16b, bisect_by=Plane(origin=(-5.452790229, -26.207463809, 4), z_dir=(0, 0, 1)), keep=Keep.TOP, mode=Mode.PRIVATE)
    fillet_1_piece_16 = fillet_1_piece_16a & fillet_1_piece_16b
    add(fillet_1_piece_16)


solid = part.part
